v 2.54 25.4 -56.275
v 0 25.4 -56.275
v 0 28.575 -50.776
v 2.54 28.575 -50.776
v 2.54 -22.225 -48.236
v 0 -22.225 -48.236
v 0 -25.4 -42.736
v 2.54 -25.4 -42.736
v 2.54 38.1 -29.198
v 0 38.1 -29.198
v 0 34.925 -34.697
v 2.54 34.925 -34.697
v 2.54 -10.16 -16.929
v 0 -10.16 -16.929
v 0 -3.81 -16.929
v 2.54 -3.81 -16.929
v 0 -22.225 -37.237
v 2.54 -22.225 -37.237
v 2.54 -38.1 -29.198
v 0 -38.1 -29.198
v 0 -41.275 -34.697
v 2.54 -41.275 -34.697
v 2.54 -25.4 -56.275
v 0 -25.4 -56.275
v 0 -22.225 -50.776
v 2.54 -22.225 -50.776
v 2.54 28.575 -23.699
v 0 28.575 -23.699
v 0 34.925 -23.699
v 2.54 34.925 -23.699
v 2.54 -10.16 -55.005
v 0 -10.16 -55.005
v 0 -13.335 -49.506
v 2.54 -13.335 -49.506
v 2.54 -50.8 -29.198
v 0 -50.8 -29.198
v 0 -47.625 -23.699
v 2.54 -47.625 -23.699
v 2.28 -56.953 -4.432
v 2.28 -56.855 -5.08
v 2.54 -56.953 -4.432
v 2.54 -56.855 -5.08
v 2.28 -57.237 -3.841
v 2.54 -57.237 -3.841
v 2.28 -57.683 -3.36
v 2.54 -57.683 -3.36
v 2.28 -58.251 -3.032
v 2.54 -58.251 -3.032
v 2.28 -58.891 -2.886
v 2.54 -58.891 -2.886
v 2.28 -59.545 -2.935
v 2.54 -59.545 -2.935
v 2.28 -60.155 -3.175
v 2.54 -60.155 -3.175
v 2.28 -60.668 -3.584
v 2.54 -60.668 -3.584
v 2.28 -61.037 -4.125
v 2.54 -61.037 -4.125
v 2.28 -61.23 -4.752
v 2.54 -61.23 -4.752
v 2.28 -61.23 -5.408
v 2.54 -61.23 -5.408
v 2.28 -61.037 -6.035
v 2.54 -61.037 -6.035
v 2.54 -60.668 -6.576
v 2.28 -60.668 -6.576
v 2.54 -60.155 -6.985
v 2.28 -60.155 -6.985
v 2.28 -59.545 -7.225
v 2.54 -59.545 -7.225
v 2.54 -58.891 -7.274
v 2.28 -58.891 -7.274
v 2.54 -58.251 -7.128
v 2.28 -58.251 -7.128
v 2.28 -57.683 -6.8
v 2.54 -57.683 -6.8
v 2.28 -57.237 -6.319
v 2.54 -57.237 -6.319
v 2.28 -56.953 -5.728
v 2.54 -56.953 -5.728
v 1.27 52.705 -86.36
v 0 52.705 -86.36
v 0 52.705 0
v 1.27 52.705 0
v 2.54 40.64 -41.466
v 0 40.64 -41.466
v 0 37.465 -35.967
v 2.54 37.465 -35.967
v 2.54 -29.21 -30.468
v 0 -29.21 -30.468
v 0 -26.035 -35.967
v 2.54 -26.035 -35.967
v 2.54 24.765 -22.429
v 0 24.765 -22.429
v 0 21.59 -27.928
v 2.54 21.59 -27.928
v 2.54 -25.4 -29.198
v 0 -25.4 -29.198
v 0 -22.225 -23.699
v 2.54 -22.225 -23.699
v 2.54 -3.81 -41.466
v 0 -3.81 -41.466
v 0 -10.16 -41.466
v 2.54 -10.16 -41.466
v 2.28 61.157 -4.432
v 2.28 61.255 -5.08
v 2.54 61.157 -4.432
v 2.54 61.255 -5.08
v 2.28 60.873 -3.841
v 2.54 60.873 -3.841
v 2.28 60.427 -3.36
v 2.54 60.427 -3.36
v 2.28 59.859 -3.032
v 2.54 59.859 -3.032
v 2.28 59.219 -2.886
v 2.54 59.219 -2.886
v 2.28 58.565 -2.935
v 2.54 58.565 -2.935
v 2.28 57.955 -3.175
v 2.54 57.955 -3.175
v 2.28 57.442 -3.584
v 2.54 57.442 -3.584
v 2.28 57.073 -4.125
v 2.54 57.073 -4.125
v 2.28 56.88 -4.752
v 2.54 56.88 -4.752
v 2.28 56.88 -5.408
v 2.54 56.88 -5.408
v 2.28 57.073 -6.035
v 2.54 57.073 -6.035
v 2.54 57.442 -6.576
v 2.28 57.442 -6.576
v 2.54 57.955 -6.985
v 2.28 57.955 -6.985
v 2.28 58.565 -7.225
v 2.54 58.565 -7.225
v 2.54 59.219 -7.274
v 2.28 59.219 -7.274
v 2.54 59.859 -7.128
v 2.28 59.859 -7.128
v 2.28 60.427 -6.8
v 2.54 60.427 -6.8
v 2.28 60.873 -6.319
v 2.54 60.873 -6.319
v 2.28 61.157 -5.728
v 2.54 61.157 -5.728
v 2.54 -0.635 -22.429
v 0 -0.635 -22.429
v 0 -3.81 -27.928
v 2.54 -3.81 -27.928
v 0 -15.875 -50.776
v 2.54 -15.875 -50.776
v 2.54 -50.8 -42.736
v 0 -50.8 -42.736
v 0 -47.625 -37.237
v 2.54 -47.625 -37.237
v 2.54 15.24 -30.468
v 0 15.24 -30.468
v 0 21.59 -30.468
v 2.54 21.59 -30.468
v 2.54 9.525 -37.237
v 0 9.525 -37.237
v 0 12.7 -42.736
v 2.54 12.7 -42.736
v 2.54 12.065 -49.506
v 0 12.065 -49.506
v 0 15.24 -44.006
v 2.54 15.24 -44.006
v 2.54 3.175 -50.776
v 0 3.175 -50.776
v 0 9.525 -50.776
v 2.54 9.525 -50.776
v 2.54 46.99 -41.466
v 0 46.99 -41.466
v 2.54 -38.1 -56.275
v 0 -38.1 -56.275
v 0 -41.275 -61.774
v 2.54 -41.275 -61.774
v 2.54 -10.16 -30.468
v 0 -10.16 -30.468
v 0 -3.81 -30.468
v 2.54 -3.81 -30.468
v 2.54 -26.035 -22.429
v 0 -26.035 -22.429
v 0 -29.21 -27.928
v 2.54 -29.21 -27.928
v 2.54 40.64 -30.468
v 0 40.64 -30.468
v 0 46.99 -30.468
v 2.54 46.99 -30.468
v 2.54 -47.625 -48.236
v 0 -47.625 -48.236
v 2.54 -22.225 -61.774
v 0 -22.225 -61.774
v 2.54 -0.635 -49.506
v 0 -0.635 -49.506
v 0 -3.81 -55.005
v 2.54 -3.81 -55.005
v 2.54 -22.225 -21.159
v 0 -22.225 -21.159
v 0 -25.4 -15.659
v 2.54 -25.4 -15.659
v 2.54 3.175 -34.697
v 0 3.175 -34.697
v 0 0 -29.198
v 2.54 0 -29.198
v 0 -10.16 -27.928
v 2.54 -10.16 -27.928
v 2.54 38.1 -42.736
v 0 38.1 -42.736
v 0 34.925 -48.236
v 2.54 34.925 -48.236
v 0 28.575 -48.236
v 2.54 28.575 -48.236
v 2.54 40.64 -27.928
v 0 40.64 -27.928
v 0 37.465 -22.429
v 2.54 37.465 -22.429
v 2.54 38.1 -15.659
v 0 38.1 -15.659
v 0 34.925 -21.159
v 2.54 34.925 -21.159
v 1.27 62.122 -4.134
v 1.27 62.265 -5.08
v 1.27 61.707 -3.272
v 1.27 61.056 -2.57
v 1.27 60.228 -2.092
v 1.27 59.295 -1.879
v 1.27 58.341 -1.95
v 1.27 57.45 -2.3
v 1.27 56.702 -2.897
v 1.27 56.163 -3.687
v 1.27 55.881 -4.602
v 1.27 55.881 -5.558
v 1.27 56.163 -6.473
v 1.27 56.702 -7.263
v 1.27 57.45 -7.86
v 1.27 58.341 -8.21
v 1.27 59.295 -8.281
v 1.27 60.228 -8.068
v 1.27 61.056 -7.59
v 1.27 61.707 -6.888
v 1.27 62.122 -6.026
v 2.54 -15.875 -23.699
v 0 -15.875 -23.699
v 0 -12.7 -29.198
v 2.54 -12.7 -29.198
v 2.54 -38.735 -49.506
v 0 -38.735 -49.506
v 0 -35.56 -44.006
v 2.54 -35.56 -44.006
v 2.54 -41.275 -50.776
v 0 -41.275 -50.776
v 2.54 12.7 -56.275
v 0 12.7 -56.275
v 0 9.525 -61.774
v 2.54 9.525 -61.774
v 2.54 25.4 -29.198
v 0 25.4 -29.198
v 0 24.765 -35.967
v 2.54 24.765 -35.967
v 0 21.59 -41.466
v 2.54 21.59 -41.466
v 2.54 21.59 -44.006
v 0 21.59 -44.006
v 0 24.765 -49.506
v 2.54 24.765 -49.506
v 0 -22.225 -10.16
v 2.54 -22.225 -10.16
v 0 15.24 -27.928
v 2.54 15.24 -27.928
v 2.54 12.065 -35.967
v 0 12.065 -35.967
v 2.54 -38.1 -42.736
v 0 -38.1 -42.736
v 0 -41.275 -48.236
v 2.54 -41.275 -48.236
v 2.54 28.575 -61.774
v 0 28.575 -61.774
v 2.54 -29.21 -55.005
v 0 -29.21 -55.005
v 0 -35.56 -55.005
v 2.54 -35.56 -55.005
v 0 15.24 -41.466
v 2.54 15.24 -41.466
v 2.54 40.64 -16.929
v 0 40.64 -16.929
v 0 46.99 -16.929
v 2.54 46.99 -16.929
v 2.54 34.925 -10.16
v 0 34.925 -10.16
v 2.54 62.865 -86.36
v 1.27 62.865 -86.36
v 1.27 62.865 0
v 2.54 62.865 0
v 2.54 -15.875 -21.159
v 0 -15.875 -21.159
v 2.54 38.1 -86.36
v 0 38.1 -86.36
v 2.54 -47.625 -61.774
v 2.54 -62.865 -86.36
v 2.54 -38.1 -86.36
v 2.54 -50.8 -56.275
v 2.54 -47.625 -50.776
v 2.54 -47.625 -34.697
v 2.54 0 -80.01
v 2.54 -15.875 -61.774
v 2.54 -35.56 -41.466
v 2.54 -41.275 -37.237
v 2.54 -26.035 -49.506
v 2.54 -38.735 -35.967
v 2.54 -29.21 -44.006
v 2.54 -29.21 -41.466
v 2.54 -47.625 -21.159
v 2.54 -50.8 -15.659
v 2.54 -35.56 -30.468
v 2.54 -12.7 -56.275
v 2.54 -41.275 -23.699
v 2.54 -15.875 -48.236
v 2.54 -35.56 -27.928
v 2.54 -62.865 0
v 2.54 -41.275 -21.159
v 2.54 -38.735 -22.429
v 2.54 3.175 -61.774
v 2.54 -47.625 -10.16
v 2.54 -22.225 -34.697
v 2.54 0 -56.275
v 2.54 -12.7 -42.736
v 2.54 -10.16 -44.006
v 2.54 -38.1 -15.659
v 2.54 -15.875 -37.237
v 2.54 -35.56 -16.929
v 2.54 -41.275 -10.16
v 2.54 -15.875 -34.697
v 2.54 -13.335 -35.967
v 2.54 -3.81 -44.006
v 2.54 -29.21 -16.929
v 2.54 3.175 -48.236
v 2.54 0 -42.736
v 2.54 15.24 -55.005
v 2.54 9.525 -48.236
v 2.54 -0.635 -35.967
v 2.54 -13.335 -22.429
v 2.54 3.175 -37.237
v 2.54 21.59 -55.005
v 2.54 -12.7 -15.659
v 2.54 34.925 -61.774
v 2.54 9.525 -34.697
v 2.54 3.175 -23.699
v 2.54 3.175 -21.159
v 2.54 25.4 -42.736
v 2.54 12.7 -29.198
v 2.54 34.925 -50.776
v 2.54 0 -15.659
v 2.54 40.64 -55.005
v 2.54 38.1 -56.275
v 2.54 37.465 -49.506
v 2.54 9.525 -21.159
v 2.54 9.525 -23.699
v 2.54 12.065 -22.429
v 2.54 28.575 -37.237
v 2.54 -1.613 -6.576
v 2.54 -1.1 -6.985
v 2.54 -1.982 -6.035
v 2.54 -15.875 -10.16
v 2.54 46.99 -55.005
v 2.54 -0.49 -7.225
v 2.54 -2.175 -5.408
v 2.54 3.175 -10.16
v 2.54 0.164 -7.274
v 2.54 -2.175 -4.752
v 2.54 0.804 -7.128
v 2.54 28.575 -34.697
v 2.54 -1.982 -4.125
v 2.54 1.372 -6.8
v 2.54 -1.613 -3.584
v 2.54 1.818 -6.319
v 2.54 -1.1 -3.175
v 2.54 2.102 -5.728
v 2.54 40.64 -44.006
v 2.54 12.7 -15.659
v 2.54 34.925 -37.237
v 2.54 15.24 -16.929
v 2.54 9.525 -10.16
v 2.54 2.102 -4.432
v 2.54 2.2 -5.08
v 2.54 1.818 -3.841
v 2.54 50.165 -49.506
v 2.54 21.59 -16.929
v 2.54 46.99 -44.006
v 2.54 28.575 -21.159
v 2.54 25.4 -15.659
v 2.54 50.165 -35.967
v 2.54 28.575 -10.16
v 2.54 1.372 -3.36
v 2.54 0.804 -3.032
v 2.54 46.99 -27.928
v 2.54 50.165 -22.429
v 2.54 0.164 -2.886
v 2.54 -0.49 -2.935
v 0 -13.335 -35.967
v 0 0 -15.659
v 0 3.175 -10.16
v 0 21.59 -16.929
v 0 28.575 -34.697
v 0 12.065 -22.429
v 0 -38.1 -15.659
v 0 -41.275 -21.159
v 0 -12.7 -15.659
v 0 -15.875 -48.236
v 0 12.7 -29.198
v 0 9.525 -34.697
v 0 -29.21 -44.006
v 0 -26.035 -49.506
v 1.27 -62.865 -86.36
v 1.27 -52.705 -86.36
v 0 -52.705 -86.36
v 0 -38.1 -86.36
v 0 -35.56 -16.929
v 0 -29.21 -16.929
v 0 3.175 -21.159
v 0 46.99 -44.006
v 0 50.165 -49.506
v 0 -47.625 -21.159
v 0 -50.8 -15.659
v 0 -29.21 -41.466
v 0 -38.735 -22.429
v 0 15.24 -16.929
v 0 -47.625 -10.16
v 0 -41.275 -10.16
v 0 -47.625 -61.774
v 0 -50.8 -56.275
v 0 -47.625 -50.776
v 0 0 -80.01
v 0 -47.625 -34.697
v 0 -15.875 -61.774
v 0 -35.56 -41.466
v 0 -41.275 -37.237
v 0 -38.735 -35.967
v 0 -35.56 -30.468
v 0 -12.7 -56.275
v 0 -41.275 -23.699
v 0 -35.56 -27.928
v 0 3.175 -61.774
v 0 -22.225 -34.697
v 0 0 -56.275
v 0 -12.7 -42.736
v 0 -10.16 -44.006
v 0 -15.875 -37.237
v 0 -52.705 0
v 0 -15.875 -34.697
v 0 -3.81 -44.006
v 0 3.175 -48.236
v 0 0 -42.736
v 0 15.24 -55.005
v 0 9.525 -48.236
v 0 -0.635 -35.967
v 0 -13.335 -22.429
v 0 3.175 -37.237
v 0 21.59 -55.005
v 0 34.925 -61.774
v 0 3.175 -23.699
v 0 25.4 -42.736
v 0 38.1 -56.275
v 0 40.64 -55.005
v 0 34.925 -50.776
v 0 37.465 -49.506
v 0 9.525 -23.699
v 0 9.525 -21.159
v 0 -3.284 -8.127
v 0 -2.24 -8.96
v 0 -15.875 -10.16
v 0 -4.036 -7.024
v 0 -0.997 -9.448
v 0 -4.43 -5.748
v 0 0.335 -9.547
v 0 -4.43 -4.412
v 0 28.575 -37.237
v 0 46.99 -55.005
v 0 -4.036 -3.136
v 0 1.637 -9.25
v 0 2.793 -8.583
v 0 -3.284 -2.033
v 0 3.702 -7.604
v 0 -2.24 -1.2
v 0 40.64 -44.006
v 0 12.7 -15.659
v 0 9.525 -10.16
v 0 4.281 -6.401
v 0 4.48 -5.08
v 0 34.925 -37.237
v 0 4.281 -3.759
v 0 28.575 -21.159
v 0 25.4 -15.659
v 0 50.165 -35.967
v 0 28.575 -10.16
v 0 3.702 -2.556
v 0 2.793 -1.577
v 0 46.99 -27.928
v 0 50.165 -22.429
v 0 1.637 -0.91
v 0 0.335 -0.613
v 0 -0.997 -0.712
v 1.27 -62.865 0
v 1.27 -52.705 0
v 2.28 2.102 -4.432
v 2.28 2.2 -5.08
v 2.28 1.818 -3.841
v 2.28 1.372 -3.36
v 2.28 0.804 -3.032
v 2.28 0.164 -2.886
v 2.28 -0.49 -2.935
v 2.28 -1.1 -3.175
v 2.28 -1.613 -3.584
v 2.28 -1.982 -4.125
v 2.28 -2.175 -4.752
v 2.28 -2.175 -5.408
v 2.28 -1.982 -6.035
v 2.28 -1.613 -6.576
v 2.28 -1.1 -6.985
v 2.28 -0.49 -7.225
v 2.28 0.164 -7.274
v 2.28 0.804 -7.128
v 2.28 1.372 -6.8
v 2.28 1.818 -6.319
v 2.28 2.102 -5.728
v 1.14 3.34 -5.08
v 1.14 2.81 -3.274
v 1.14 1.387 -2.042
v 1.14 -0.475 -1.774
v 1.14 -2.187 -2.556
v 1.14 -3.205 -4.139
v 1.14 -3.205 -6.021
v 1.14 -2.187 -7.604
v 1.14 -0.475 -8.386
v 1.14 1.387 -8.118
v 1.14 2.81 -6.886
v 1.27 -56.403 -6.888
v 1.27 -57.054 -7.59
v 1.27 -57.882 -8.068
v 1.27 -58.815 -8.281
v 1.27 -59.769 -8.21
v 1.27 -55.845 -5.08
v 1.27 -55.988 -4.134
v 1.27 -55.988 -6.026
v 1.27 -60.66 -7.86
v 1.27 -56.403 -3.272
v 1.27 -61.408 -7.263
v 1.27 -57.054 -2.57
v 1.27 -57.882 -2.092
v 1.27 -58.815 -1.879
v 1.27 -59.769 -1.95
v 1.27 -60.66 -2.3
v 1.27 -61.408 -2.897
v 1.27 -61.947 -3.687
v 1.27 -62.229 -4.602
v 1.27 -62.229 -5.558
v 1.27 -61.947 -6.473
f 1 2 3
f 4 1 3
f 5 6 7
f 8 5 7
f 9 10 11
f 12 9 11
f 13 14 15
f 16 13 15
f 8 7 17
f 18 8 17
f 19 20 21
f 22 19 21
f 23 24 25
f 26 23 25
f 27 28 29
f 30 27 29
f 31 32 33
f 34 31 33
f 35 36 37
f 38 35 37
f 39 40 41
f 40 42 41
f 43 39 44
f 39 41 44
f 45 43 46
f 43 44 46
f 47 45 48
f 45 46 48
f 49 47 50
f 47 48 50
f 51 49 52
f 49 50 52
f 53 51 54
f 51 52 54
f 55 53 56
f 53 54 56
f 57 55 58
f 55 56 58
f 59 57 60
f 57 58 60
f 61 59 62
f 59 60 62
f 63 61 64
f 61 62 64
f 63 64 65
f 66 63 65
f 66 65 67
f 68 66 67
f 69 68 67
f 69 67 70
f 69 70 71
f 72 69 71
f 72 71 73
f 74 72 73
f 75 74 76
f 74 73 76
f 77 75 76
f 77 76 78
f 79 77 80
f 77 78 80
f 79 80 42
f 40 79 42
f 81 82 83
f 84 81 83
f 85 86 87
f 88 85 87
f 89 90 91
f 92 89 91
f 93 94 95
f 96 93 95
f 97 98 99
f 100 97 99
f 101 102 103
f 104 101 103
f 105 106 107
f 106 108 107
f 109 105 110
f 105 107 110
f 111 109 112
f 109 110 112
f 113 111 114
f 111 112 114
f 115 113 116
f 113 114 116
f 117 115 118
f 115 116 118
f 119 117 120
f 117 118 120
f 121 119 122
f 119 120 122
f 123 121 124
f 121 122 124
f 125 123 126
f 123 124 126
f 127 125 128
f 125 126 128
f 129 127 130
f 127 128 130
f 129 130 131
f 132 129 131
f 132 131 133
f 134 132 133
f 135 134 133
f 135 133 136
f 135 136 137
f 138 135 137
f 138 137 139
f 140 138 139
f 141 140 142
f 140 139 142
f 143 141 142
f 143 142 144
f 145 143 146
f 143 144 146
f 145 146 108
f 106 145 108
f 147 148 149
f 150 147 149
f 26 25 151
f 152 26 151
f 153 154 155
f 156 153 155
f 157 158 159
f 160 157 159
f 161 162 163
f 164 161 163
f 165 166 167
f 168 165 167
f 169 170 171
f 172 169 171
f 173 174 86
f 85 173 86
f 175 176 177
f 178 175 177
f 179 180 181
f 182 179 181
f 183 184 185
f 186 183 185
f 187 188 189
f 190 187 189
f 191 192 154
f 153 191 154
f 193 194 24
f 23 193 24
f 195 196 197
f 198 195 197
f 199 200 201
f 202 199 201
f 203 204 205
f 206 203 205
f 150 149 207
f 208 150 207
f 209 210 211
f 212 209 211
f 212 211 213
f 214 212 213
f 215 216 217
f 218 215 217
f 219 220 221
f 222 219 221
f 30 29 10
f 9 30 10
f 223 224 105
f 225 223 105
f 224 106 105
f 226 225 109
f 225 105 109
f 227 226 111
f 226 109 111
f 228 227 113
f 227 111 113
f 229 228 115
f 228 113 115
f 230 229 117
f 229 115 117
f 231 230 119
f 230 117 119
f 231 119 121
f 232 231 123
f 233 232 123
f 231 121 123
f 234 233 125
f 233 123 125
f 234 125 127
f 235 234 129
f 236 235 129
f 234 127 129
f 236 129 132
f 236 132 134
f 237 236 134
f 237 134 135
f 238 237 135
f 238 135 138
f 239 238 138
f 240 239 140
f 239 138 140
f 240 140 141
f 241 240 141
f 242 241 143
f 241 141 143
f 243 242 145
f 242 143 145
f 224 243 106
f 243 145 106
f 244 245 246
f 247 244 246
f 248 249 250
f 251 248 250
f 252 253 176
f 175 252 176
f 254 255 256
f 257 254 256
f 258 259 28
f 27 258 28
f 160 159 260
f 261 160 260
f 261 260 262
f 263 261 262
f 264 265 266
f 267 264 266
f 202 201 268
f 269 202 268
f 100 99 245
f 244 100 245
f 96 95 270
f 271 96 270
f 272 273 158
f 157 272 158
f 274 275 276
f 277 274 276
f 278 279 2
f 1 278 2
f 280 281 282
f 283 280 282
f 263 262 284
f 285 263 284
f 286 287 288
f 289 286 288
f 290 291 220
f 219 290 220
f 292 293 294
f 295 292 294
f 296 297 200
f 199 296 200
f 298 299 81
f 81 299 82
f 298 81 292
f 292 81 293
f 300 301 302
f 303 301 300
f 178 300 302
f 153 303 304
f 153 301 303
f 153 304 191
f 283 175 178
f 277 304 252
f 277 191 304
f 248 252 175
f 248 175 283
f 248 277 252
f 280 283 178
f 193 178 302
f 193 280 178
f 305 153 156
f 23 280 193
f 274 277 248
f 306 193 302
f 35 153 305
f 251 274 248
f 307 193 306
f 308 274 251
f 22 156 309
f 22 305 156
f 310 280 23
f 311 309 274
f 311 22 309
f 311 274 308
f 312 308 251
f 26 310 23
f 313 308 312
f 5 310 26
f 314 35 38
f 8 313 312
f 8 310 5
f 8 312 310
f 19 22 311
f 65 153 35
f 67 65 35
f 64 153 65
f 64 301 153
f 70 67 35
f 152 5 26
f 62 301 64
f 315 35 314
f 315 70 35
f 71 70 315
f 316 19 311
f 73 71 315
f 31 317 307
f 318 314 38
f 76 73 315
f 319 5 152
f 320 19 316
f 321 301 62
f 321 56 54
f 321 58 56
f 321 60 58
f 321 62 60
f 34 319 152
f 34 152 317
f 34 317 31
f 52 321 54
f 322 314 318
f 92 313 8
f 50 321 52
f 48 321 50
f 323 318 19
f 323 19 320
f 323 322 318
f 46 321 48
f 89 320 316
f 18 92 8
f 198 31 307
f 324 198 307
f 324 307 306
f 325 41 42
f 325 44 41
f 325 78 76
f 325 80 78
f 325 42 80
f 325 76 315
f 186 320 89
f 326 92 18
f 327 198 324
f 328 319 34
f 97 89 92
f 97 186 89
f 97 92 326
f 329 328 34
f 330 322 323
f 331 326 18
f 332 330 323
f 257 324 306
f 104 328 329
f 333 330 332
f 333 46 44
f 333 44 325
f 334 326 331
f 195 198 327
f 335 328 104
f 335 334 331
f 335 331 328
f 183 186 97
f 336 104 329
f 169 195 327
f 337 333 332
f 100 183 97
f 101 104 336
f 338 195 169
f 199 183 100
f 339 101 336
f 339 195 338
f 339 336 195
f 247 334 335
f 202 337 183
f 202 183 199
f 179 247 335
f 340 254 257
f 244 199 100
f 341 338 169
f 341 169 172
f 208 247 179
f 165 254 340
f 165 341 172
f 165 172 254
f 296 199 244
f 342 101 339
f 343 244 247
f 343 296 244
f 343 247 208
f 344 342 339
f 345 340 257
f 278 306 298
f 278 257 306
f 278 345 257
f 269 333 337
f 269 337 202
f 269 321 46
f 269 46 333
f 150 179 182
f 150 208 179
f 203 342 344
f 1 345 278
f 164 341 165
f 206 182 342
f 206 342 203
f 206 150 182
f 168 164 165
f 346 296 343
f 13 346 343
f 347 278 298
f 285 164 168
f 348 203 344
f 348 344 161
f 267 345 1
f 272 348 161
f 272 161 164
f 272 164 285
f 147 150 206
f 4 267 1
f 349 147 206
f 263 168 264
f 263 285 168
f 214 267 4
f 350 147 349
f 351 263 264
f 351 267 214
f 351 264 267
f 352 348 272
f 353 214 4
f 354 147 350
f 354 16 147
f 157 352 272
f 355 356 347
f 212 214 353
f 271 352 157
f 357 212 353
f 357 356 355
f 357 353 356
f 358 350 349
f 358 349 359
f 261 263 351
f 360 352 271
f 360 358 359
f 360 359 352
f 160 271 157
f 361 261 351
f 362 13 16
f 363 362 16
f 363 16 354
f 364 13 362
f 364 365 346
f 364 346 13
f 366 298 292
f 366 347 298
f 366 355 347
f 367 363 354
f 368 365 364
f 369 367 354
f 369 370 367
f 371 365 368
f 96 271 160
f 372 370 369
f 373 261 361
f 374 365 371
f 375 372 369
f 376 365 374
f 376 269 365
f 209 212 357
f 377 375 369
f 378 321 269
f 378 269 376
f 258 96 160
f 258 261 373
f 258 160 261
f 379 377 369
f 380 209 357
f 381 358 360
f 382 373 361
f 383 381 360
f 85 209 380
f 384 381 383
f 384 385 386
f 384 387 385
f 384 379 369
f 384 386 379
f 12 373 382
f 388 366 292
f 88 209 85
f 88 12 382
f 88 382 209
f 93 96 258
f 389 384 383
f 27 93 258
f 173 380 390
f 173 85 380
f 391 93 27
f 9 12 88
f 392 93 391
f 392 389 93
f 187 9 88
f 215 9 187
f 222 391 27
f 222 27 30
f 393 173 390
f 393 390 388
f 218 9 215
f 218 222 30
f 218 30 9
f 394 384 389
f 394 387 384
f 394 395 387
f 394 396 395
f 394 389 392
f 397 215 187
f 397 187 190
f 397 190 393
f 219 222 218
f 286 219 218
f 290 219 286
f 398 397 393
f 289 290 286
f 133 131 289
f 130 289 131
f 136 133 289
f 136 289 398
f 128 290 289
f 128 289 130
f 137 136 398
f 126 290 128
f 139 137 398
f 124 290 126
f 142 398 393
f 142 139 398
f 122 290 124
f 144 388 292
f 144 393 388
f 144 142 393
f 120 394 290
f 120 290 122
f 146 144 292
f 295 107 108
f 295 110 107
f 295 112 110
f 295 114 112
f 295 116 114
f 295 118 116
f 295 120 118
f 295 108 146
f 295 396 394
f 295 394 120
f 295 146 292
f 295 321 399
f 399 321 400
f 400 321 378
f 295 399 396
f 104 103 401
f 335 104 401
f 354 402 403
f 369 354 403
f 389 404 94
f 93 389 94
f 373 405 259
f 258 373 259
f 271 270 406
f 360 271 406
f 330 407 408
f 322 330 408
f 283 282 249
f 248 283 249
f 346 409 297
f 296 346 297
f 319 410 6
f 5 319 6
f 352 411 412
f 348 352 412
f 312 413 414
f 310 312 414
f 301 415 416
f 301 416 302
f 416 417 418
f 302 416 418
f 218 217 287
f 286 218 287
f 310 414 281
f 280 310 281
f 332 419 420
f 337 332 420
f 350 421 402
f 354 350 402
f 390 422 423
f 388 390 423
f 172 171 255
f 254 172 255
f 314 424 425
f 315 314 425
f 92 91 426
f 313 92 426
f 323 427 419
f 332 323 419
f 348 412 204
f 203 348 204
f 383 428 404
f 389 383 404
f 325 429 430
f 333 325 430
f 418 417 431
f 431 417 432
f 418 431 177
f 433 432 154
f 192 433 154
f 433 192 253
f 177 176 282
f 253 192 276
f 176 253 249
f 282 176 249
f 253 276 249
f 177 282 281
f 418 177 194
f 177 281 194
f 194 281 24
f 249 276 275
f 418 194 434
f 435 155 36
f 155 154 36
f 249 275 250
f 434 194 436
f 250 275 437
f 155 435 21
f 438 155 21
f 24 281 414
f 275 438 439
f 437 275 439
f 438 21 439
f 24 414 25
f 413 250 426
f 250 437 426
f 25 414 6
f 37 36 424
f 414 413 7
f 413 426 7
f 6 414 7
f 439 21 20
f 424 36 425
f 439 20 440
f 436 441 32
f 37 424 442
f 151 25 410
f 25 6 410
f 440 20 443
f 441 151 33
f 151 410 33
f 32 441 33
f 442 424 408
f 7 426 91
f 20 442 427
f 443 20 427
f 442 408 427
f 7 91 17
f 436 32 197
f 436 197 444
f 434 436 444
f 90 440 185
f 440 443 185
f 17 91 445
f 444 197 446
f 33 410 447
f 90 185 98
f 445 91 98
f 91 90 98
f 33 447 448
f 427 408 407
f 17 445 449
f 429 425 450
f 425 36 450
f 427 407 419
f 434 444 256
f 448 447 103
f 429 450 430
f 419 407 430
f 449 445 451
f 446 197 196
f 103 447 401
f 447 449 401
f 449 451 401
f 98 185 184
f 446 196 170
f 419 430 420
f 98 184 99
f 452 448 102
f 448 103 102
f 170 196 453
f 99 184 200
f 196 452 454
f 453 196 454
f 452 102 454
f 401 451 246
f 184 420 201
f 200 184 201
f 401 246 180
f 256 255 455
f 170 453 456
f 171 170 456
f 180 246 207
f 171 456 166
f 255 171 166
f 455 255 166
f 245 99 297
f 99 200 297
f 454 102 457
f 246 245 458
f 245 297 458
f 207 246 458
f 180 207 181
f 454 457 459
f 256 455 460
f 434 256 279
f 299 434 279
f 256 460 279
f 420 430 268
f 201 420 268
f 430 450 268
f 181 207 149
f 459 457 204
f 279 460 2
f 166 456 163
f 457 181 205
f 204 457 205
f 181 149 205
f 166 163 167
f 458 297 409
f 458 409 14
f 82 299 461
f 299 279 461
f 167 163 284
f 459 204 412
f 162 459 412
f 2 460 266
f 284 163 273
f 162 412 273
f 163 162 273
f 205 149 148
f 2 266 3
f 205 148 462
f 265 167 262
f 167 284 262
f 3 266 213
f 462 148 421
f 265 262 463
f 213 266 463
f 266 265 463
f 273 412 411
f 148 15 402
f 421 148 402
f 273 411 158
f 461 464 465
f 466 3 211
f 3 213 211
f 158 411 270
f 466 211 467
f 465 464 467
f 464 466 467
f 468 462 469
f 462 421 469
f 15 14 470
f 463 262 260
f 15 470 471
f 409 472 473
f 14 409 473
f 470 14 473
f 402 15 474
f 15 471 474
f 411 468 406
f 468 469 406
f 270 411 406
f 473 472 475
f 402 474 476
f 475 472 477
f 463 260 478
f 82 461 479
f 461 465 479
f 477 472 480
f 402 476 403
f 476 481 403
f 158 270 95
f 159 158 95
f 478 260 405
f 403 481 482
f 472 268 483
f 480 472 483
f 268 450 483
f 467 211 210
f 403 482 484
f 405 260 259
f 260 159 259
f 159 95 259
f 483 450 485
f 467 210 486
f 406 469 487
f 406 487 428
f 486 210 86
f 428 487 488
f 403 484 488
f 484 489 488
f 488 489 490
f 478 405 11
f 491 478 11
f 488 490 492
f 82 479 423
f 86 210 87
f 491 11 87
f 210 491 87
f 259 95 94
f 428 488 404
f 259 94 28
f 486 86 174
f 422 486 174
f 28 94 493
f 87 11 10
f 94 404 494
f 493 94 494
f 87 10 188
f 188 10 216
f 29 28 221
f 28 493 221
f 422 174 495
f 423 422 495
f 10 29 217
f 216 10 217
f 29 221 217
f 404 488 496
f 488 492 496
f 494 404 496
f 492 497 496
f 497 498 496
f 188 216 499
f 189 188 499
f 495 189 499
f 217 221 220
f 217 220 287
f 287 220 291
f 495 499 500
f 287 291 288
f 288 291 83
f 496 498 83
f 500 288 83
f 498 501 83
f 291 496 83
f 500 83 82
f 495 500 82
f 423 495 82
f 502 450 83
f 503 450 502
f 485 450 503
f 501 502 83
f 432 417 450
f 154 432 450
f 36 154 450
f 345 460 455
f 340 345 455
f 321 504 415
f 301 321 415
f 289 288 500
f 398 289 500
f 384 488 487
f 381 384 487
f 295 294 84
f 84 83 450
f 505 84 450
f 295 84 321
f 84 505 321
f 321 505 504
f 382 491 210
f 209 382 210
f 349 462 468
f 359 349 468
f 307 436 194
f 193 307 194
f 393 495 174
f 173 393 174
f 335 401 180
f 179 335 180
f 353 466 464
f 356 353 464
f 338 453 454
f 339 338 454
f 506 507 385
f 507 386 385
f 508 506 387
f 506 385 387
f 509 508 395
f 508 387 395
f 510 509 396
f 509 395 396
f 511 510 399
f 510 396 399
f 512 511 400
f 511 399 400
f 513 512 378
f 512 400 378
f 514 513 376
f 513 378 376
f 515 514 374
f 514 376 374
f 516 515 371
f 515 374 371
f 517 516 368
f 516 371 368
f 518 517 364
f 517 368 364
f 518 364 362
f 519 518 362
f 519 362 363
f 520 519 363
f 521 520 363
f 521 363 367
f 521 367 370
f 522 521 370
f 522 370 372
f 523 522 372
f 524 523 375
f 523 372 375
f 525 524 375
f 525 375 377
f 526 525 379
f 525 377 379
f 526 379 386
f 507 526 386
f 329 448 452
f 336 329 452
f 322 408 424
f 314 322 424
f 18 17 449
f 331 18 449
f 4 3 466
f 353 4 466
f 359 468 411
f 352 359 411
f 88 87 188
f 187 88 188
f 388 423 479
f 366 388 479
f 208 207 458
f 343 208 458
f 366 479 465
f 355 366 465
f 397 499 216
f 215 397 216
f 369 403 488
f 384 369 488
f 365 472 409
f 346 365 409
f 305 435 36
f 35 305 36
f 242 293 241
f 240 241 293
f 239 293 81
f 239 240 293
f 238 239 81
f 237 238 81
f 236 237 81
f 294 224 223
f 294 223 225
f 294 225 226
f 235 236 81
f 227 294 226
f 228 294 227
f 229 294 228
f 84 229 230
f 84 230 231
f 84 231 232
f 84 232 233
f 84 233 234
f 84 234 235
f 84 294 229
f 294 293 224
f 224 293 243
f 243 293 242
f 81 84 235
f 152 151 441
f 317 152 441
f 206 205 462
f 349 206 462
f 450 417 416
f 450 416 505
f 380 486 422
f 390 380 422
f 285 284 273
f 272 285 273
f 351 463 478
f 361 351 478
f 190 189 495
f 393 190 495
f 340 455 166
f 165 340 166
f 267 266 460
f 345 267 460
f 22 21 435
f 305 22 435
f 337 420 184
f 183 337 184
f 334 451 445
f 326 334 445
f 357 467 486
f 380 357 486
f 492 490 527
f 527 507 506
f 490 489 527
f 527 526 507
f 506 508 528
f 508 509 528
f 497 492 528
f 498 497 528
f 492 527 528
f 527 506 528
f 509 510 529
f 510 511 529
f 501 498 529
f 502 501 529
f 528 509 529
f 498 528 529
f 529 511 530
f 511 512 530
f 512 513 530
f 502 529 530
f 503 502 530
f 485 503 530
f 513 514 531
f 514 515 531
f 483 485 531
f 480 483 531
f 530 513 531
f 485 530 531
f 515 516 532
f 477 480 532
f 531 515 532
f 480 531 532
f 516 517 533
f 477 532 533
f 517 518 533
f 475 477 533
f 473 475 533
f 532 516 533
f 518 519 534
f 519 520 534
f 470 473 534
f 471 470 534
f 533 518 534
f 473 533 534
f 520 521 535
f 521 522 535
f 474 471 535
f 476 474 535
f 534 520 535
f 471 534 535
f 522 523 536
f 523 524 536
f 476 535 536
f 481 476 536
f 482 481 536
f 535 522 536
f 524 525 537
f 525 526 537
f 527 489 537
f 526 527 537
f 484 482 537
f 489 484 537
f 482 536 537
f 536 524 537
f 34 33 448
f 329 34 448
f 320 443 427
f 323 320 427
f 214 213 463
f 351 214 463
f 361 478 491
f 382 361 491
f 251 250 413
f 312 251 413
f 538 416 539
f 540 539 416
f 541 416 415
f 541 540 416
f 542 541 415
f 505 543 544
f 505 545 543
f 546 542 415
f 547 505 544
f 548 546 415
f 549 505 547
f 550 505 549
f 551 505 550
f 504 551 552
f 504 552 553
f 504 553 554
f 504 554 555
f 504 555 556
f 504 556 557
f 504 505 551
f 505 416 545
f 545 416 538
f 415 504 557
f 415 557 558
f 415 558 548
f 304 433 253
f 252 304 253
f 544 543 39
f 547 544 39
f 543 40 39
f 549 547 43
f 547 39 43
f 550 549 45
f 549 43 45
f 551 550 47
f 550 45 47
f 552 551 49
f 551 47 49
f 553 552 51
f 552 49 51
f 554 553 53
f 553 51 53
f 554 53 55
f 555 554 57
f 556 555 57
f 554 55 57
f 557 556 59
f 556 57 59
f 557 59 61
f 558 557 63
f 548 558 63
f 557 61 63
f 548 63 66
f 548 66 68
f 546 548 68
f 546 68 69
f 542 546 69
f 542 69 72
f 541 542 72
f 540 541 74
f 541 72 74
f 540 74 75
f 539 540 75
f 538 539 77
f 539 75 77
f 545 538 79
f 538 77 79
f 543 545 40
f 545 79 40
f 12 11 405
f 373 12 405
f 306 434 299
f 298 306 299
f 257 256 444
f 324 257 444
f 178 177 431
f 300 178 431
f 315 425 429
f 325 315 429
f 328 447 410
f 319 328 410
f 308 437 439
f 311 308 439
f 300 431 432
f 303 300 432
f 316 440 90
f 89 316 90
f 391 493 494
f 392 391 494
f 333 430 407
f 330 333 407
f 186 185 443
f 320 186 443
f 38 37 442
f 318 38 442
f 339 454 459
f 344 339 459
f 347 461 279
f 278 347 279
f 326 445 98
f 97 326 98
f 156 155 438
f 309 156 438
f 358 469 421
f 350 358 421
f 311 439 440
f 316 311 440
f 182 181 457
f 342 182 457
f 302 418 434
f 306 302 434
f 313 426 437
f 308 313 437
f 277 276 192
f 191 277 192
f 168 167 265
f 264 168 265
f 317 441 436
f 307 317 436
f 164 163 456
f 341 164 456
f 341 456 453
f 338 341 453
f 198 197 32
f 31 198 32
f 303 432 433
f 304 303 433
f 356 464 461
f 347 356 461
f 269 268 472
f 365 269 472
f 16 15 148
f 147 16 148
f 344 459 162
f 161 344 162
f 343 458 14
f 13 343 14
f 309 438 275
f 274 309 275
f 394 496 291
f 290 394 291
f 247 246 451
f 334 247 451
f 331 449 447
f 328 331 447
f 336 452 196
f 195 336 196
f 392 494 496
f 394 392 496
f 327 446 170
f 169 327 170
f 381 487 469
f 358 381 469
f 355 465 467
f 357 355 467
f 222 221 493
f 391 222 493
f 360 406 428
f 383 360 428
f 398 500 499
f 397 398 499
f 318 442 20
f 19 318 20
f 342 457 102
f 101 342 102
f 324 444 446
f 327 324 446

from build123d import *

# Parameters (mm, degrees)
F1_DEPTH       = 2.54
F3_D           = 4.4
F3_DEPTH       = 37.1856
F3_CSINK_D     = 8.96
F3_CSINK_ANGLE = 90
F3_TIP         = 1.3218933619
F4_W           = 26.1344808769
F4_H           = 86.36
F5_DEPTH       = 1.27
F7_DEPTH       = 25.4


with BuildPart() as f1:
    # F0 (on Right) → F1 (new body)
    with BuildSketch(Plane.YZ):
        Polygon((62.865, 0), (-62.865, 0), (-60.325, -86.36), (60.325, -86.36), align=None)
        Polygon((-60.325, -86.36), (-62.865, 0), (-62.865, -86.36), align=None)
        Polygon((62.865, -86.36), (62.865, 0), (60.325, -86.36), align=None)
    extrude(amount=F1_DEPTH)

    # F3
    with Locations(Plane(origin=(0, 0, 0), x_dir=(0, -1, 0), z_dir=(-1, 0, 0))):
        with Locations((-59.055, -5.08), (0, -5.08), (59.055, -5.08)):
            CounterSinkHole(F3_D / 2, F3_CSINK_D / 2, depth=F3_DEPTH, counter_sink_angle=F3_CSINK_ANGLE)
            with Locations((0, 0, -(F3_DEPTH + F3_TIP / 2))):  # 118° drill point
                Cone(0, F3_D / 2, F3_TIP, mode=Mode.SUBTRACT)

    # F4 (on face) → F5 (cut)
    with BuildSketch(Plane(origin=(0, 0, 0), x_dir=(0, -1, 0), z_dir=(-1, 0, 0))):
        with Locations((-65.7722404385, -43.18)):
            Rectangle(F4_W, F4_H)
        with Locations((65.7722404385, -43.18)):
            Rectangle(F4_W, F4_H)
    extrude(amount=-F5_DEPTH, mode=Mode.SUBTRACT)

    # F6 (on face) → F7 (cut)
    with BuildSketch(Plane(origin=(0, 0, 0), x_dir=(0, -1, 0), z_dir=(-1, 0, 0))):
        Polygon((0, -80.01), (-38.1, -86.36), (38.1, -86.36), align=None)
        Polygon((-40.64, -16.929261314), (-46.99, -16.929261314), (-50.165, -22.4285226281), (-46.99, -27.9277839421), (-40.64, -27.9277839421), (-37.465, -22.4285226281), align=None)
        Polygon((-40.64, -30.4677839421), (-46.99, -30.4677839421), (-50.165, -35.9670452561), (-46.99, -41.4663065701), (-40.64, -41.4663065701), (-37.465, -35.9670452561), align=None)
        Polygon((-40.64, -44.0063065701), (-46.99, -44.0063065701), (-50.165, -49.5055678841), (-46.99, -55.0048291981), (-40.64, -55.0048291981), (-39.0525, -52.2551985411), (-37.465, -49.5055678841), align=None)
        Polygon((-34.925, -37.2370452561), (-38.1, -42.7363065701), (-34.925, -48.2355678841), (-28.575, -48.2355678841), (-25.4, -42.7363065701), (-28.575, -37.2370452561), align=None)
        Polygon((-34.925, -34.6970452561), (-28.575, -34.6970452561), (-25.4, -29.1977839421), (-28.575, -23.698522628), (-34.925, -23.698522628), (-38.1, -29.1977839421), align=None)
        Polygon((-34.925, -21.1585226281), (-28.575, -21.1585226281), (-25.4, -15.659261314), (-28.575, -10.16), (-34.925, -10.16), (-38.1, -15.659261314), align=None)
        Polygon((-28.575, -50.7755678841), (-34.925, -50.7755678841), (-38.1, -56.2748291981), (-34.925, -61.7740905122), (-28.575, -61.7740905122), (-25.4, -56.2748291981), align=None)
        Polygon((-12.7, -29.1977839421), (-9.525, -34.6970452561), (-3.175, -34.6970452561), (0, -29.1977839421), (-3.175, -23.698522628), (-9.525, -23.698522628), align=None)
        Polygon((-12.065, -35.9670452561), (-15.24, -30.4677839421), (-21.59, -30.4677839421), (-24.765, -35.9670452561), (-21.59, -41.4663065701), (-15.24, -41.4663065701), align=None)
        Polygon((-3.175, -61.7740905122), (0, -56.2748291981), (-3.175, -50.7755678841), (-9.525, -50.7755678841), (-12.7, -56.2748291981), (-9.525, -61.7740905122), align=None)
        Polygon((-9.525, -10.16), (-12.7, -15.659261314), (-9.525, -21.1585226281), (-3.175, -21.1585226281), (0, -15.659261314), (-3.175, -10.16), align=None)
        Polygon((-12.065, -49.5055678841), (-15.24, -44.0063065701), (-21.59, -44.0063065701), (-24.765, -49.5055678841), (-21.59, -55.0048291981), (-15.24, -55.0048291981), (-13.6525, -52.2551985411), align=None)
        Polygon((-15.24, -27.9277839421), (-12.065, -22.4285226281), (-15.24, -16.929261314), (-21.59, -16.929261314), (-24.765, -22.4285226281), (-21.59, -27.9277839421), align=None)
        Polygon((-12.7, -42.7363065701), (-9.525, -48.2355678841), (-3.175, -48.2355678841), (0, -42.7363065701), (-3.175, -37.2370452561), (-9.525, -37.2370452561), align=None)
        Polygon((12.7, -29.1977839421), (15.875, -34.6970452561), (22.225, -34.6970452561), (25.4, -29.1977839421), (22.225, -23.698522628), (15.875, -23.698522628), align=None)
        Polygon((13.335, -35.9670452561), (10.16, -30.4677839421), (3.81, -30.4677839421), (0.635, -35.9670452561), (3.81, -41.4663065701), (10.16, -41.4663065701), align=None)
        Polygon((22.225, -61.7740905122), (25.4, -56.2748291981), (22.225, -50.7755678841), (15.875, -50.7755678841), (12.7, -56.2748291981), (15.875, -61.7740905122), align=None)
        Polygon((15.875, -10.16), (12.7, -15.659261314), (15.875, -21.1585226281), (22.225, -21.1585226281), (25.4, -15.659261314), (22.225, -10.16), align=None)
        Polygon((13.335, -49.5055678841), (10.16, -44.0063065701), (3.81, -44.0063065701), (0.635, -49.5055678841), (3.81, -55.0048291981), (10.16, -55.0048291981), (11.7475, -52.2551985411), align=None)
        Polygon((10.16, -27.9277839421), (13.335, -22.4285226281), (10.16, -16.929261314), (3.81, -16.929261314), (0.635, -22.4285226281), (3.81, -27.9277839421), align=None)
        Polygon((12.7, -42.7363065701), (15.875, -48.2355678841), (22.225, -48.2355678841), (25.4, -42.7363065701), (22.225, -37.2370452561), (15.875, -37.2370452561), align=None)
        Polygon((38.1, -29.1977839421), (41.275, -34.6970452561), (47.625, -34.6970452561), (50.8, -29.1977839421), (47.625, -23.698522628), (41.275, -23.698522628), align=None)
        Polygon((38.735, -35.9670452561), (35.56, -30.4677839421), (29.21, -30.4677839421), (26.035, -35.9670452561), (29.21, -41.4663065701), (35.56, -41.4663065701), align=None)
        Polygon((47.625, -61.7740905122), (50.8, -56.2748291981), (47.625, -50.7755678841), (41.275, -50.7755678841), (38.1, -56.2748291981), (41.275, -61.7740905122), align=None)
        Polygon((41.275, -10.16), (38.1, -15.659261314), (41.275, -21.1585226281), (47.625, -21.1585226281), (50.8, -15.659261314), (47.625, -10.16), align=None)
        Polygon((38.735, -49.5055678841), (35.56, -44.0063065701), (29.21, -44.0063065701), (26.035, -49.5055678841), (29.21, -55.0048291981), (35.56, -55.0048291981), (37.1475, -52.2551985411), align=None)
        Polygon((35.56, -27.9277839421), (38.735, -22.4285226281), (35.56, -16.929261314), (29.21, -16.929261314), (26.035, -22.4285226281), (29.21, -27.9277839421), align=None)
        Polygon((38.1, -42.7363065701), (41.275, -48.2355678841), (47.625, -48.2355678841), (50.8, -42.7363065701), (47.625, -37.2370452561), (41.275, -37.2370452561), align=None)
    extrude(amount=-F7_DEPTH, mode=Mode.SUBTRACT)


solid = f1.part
